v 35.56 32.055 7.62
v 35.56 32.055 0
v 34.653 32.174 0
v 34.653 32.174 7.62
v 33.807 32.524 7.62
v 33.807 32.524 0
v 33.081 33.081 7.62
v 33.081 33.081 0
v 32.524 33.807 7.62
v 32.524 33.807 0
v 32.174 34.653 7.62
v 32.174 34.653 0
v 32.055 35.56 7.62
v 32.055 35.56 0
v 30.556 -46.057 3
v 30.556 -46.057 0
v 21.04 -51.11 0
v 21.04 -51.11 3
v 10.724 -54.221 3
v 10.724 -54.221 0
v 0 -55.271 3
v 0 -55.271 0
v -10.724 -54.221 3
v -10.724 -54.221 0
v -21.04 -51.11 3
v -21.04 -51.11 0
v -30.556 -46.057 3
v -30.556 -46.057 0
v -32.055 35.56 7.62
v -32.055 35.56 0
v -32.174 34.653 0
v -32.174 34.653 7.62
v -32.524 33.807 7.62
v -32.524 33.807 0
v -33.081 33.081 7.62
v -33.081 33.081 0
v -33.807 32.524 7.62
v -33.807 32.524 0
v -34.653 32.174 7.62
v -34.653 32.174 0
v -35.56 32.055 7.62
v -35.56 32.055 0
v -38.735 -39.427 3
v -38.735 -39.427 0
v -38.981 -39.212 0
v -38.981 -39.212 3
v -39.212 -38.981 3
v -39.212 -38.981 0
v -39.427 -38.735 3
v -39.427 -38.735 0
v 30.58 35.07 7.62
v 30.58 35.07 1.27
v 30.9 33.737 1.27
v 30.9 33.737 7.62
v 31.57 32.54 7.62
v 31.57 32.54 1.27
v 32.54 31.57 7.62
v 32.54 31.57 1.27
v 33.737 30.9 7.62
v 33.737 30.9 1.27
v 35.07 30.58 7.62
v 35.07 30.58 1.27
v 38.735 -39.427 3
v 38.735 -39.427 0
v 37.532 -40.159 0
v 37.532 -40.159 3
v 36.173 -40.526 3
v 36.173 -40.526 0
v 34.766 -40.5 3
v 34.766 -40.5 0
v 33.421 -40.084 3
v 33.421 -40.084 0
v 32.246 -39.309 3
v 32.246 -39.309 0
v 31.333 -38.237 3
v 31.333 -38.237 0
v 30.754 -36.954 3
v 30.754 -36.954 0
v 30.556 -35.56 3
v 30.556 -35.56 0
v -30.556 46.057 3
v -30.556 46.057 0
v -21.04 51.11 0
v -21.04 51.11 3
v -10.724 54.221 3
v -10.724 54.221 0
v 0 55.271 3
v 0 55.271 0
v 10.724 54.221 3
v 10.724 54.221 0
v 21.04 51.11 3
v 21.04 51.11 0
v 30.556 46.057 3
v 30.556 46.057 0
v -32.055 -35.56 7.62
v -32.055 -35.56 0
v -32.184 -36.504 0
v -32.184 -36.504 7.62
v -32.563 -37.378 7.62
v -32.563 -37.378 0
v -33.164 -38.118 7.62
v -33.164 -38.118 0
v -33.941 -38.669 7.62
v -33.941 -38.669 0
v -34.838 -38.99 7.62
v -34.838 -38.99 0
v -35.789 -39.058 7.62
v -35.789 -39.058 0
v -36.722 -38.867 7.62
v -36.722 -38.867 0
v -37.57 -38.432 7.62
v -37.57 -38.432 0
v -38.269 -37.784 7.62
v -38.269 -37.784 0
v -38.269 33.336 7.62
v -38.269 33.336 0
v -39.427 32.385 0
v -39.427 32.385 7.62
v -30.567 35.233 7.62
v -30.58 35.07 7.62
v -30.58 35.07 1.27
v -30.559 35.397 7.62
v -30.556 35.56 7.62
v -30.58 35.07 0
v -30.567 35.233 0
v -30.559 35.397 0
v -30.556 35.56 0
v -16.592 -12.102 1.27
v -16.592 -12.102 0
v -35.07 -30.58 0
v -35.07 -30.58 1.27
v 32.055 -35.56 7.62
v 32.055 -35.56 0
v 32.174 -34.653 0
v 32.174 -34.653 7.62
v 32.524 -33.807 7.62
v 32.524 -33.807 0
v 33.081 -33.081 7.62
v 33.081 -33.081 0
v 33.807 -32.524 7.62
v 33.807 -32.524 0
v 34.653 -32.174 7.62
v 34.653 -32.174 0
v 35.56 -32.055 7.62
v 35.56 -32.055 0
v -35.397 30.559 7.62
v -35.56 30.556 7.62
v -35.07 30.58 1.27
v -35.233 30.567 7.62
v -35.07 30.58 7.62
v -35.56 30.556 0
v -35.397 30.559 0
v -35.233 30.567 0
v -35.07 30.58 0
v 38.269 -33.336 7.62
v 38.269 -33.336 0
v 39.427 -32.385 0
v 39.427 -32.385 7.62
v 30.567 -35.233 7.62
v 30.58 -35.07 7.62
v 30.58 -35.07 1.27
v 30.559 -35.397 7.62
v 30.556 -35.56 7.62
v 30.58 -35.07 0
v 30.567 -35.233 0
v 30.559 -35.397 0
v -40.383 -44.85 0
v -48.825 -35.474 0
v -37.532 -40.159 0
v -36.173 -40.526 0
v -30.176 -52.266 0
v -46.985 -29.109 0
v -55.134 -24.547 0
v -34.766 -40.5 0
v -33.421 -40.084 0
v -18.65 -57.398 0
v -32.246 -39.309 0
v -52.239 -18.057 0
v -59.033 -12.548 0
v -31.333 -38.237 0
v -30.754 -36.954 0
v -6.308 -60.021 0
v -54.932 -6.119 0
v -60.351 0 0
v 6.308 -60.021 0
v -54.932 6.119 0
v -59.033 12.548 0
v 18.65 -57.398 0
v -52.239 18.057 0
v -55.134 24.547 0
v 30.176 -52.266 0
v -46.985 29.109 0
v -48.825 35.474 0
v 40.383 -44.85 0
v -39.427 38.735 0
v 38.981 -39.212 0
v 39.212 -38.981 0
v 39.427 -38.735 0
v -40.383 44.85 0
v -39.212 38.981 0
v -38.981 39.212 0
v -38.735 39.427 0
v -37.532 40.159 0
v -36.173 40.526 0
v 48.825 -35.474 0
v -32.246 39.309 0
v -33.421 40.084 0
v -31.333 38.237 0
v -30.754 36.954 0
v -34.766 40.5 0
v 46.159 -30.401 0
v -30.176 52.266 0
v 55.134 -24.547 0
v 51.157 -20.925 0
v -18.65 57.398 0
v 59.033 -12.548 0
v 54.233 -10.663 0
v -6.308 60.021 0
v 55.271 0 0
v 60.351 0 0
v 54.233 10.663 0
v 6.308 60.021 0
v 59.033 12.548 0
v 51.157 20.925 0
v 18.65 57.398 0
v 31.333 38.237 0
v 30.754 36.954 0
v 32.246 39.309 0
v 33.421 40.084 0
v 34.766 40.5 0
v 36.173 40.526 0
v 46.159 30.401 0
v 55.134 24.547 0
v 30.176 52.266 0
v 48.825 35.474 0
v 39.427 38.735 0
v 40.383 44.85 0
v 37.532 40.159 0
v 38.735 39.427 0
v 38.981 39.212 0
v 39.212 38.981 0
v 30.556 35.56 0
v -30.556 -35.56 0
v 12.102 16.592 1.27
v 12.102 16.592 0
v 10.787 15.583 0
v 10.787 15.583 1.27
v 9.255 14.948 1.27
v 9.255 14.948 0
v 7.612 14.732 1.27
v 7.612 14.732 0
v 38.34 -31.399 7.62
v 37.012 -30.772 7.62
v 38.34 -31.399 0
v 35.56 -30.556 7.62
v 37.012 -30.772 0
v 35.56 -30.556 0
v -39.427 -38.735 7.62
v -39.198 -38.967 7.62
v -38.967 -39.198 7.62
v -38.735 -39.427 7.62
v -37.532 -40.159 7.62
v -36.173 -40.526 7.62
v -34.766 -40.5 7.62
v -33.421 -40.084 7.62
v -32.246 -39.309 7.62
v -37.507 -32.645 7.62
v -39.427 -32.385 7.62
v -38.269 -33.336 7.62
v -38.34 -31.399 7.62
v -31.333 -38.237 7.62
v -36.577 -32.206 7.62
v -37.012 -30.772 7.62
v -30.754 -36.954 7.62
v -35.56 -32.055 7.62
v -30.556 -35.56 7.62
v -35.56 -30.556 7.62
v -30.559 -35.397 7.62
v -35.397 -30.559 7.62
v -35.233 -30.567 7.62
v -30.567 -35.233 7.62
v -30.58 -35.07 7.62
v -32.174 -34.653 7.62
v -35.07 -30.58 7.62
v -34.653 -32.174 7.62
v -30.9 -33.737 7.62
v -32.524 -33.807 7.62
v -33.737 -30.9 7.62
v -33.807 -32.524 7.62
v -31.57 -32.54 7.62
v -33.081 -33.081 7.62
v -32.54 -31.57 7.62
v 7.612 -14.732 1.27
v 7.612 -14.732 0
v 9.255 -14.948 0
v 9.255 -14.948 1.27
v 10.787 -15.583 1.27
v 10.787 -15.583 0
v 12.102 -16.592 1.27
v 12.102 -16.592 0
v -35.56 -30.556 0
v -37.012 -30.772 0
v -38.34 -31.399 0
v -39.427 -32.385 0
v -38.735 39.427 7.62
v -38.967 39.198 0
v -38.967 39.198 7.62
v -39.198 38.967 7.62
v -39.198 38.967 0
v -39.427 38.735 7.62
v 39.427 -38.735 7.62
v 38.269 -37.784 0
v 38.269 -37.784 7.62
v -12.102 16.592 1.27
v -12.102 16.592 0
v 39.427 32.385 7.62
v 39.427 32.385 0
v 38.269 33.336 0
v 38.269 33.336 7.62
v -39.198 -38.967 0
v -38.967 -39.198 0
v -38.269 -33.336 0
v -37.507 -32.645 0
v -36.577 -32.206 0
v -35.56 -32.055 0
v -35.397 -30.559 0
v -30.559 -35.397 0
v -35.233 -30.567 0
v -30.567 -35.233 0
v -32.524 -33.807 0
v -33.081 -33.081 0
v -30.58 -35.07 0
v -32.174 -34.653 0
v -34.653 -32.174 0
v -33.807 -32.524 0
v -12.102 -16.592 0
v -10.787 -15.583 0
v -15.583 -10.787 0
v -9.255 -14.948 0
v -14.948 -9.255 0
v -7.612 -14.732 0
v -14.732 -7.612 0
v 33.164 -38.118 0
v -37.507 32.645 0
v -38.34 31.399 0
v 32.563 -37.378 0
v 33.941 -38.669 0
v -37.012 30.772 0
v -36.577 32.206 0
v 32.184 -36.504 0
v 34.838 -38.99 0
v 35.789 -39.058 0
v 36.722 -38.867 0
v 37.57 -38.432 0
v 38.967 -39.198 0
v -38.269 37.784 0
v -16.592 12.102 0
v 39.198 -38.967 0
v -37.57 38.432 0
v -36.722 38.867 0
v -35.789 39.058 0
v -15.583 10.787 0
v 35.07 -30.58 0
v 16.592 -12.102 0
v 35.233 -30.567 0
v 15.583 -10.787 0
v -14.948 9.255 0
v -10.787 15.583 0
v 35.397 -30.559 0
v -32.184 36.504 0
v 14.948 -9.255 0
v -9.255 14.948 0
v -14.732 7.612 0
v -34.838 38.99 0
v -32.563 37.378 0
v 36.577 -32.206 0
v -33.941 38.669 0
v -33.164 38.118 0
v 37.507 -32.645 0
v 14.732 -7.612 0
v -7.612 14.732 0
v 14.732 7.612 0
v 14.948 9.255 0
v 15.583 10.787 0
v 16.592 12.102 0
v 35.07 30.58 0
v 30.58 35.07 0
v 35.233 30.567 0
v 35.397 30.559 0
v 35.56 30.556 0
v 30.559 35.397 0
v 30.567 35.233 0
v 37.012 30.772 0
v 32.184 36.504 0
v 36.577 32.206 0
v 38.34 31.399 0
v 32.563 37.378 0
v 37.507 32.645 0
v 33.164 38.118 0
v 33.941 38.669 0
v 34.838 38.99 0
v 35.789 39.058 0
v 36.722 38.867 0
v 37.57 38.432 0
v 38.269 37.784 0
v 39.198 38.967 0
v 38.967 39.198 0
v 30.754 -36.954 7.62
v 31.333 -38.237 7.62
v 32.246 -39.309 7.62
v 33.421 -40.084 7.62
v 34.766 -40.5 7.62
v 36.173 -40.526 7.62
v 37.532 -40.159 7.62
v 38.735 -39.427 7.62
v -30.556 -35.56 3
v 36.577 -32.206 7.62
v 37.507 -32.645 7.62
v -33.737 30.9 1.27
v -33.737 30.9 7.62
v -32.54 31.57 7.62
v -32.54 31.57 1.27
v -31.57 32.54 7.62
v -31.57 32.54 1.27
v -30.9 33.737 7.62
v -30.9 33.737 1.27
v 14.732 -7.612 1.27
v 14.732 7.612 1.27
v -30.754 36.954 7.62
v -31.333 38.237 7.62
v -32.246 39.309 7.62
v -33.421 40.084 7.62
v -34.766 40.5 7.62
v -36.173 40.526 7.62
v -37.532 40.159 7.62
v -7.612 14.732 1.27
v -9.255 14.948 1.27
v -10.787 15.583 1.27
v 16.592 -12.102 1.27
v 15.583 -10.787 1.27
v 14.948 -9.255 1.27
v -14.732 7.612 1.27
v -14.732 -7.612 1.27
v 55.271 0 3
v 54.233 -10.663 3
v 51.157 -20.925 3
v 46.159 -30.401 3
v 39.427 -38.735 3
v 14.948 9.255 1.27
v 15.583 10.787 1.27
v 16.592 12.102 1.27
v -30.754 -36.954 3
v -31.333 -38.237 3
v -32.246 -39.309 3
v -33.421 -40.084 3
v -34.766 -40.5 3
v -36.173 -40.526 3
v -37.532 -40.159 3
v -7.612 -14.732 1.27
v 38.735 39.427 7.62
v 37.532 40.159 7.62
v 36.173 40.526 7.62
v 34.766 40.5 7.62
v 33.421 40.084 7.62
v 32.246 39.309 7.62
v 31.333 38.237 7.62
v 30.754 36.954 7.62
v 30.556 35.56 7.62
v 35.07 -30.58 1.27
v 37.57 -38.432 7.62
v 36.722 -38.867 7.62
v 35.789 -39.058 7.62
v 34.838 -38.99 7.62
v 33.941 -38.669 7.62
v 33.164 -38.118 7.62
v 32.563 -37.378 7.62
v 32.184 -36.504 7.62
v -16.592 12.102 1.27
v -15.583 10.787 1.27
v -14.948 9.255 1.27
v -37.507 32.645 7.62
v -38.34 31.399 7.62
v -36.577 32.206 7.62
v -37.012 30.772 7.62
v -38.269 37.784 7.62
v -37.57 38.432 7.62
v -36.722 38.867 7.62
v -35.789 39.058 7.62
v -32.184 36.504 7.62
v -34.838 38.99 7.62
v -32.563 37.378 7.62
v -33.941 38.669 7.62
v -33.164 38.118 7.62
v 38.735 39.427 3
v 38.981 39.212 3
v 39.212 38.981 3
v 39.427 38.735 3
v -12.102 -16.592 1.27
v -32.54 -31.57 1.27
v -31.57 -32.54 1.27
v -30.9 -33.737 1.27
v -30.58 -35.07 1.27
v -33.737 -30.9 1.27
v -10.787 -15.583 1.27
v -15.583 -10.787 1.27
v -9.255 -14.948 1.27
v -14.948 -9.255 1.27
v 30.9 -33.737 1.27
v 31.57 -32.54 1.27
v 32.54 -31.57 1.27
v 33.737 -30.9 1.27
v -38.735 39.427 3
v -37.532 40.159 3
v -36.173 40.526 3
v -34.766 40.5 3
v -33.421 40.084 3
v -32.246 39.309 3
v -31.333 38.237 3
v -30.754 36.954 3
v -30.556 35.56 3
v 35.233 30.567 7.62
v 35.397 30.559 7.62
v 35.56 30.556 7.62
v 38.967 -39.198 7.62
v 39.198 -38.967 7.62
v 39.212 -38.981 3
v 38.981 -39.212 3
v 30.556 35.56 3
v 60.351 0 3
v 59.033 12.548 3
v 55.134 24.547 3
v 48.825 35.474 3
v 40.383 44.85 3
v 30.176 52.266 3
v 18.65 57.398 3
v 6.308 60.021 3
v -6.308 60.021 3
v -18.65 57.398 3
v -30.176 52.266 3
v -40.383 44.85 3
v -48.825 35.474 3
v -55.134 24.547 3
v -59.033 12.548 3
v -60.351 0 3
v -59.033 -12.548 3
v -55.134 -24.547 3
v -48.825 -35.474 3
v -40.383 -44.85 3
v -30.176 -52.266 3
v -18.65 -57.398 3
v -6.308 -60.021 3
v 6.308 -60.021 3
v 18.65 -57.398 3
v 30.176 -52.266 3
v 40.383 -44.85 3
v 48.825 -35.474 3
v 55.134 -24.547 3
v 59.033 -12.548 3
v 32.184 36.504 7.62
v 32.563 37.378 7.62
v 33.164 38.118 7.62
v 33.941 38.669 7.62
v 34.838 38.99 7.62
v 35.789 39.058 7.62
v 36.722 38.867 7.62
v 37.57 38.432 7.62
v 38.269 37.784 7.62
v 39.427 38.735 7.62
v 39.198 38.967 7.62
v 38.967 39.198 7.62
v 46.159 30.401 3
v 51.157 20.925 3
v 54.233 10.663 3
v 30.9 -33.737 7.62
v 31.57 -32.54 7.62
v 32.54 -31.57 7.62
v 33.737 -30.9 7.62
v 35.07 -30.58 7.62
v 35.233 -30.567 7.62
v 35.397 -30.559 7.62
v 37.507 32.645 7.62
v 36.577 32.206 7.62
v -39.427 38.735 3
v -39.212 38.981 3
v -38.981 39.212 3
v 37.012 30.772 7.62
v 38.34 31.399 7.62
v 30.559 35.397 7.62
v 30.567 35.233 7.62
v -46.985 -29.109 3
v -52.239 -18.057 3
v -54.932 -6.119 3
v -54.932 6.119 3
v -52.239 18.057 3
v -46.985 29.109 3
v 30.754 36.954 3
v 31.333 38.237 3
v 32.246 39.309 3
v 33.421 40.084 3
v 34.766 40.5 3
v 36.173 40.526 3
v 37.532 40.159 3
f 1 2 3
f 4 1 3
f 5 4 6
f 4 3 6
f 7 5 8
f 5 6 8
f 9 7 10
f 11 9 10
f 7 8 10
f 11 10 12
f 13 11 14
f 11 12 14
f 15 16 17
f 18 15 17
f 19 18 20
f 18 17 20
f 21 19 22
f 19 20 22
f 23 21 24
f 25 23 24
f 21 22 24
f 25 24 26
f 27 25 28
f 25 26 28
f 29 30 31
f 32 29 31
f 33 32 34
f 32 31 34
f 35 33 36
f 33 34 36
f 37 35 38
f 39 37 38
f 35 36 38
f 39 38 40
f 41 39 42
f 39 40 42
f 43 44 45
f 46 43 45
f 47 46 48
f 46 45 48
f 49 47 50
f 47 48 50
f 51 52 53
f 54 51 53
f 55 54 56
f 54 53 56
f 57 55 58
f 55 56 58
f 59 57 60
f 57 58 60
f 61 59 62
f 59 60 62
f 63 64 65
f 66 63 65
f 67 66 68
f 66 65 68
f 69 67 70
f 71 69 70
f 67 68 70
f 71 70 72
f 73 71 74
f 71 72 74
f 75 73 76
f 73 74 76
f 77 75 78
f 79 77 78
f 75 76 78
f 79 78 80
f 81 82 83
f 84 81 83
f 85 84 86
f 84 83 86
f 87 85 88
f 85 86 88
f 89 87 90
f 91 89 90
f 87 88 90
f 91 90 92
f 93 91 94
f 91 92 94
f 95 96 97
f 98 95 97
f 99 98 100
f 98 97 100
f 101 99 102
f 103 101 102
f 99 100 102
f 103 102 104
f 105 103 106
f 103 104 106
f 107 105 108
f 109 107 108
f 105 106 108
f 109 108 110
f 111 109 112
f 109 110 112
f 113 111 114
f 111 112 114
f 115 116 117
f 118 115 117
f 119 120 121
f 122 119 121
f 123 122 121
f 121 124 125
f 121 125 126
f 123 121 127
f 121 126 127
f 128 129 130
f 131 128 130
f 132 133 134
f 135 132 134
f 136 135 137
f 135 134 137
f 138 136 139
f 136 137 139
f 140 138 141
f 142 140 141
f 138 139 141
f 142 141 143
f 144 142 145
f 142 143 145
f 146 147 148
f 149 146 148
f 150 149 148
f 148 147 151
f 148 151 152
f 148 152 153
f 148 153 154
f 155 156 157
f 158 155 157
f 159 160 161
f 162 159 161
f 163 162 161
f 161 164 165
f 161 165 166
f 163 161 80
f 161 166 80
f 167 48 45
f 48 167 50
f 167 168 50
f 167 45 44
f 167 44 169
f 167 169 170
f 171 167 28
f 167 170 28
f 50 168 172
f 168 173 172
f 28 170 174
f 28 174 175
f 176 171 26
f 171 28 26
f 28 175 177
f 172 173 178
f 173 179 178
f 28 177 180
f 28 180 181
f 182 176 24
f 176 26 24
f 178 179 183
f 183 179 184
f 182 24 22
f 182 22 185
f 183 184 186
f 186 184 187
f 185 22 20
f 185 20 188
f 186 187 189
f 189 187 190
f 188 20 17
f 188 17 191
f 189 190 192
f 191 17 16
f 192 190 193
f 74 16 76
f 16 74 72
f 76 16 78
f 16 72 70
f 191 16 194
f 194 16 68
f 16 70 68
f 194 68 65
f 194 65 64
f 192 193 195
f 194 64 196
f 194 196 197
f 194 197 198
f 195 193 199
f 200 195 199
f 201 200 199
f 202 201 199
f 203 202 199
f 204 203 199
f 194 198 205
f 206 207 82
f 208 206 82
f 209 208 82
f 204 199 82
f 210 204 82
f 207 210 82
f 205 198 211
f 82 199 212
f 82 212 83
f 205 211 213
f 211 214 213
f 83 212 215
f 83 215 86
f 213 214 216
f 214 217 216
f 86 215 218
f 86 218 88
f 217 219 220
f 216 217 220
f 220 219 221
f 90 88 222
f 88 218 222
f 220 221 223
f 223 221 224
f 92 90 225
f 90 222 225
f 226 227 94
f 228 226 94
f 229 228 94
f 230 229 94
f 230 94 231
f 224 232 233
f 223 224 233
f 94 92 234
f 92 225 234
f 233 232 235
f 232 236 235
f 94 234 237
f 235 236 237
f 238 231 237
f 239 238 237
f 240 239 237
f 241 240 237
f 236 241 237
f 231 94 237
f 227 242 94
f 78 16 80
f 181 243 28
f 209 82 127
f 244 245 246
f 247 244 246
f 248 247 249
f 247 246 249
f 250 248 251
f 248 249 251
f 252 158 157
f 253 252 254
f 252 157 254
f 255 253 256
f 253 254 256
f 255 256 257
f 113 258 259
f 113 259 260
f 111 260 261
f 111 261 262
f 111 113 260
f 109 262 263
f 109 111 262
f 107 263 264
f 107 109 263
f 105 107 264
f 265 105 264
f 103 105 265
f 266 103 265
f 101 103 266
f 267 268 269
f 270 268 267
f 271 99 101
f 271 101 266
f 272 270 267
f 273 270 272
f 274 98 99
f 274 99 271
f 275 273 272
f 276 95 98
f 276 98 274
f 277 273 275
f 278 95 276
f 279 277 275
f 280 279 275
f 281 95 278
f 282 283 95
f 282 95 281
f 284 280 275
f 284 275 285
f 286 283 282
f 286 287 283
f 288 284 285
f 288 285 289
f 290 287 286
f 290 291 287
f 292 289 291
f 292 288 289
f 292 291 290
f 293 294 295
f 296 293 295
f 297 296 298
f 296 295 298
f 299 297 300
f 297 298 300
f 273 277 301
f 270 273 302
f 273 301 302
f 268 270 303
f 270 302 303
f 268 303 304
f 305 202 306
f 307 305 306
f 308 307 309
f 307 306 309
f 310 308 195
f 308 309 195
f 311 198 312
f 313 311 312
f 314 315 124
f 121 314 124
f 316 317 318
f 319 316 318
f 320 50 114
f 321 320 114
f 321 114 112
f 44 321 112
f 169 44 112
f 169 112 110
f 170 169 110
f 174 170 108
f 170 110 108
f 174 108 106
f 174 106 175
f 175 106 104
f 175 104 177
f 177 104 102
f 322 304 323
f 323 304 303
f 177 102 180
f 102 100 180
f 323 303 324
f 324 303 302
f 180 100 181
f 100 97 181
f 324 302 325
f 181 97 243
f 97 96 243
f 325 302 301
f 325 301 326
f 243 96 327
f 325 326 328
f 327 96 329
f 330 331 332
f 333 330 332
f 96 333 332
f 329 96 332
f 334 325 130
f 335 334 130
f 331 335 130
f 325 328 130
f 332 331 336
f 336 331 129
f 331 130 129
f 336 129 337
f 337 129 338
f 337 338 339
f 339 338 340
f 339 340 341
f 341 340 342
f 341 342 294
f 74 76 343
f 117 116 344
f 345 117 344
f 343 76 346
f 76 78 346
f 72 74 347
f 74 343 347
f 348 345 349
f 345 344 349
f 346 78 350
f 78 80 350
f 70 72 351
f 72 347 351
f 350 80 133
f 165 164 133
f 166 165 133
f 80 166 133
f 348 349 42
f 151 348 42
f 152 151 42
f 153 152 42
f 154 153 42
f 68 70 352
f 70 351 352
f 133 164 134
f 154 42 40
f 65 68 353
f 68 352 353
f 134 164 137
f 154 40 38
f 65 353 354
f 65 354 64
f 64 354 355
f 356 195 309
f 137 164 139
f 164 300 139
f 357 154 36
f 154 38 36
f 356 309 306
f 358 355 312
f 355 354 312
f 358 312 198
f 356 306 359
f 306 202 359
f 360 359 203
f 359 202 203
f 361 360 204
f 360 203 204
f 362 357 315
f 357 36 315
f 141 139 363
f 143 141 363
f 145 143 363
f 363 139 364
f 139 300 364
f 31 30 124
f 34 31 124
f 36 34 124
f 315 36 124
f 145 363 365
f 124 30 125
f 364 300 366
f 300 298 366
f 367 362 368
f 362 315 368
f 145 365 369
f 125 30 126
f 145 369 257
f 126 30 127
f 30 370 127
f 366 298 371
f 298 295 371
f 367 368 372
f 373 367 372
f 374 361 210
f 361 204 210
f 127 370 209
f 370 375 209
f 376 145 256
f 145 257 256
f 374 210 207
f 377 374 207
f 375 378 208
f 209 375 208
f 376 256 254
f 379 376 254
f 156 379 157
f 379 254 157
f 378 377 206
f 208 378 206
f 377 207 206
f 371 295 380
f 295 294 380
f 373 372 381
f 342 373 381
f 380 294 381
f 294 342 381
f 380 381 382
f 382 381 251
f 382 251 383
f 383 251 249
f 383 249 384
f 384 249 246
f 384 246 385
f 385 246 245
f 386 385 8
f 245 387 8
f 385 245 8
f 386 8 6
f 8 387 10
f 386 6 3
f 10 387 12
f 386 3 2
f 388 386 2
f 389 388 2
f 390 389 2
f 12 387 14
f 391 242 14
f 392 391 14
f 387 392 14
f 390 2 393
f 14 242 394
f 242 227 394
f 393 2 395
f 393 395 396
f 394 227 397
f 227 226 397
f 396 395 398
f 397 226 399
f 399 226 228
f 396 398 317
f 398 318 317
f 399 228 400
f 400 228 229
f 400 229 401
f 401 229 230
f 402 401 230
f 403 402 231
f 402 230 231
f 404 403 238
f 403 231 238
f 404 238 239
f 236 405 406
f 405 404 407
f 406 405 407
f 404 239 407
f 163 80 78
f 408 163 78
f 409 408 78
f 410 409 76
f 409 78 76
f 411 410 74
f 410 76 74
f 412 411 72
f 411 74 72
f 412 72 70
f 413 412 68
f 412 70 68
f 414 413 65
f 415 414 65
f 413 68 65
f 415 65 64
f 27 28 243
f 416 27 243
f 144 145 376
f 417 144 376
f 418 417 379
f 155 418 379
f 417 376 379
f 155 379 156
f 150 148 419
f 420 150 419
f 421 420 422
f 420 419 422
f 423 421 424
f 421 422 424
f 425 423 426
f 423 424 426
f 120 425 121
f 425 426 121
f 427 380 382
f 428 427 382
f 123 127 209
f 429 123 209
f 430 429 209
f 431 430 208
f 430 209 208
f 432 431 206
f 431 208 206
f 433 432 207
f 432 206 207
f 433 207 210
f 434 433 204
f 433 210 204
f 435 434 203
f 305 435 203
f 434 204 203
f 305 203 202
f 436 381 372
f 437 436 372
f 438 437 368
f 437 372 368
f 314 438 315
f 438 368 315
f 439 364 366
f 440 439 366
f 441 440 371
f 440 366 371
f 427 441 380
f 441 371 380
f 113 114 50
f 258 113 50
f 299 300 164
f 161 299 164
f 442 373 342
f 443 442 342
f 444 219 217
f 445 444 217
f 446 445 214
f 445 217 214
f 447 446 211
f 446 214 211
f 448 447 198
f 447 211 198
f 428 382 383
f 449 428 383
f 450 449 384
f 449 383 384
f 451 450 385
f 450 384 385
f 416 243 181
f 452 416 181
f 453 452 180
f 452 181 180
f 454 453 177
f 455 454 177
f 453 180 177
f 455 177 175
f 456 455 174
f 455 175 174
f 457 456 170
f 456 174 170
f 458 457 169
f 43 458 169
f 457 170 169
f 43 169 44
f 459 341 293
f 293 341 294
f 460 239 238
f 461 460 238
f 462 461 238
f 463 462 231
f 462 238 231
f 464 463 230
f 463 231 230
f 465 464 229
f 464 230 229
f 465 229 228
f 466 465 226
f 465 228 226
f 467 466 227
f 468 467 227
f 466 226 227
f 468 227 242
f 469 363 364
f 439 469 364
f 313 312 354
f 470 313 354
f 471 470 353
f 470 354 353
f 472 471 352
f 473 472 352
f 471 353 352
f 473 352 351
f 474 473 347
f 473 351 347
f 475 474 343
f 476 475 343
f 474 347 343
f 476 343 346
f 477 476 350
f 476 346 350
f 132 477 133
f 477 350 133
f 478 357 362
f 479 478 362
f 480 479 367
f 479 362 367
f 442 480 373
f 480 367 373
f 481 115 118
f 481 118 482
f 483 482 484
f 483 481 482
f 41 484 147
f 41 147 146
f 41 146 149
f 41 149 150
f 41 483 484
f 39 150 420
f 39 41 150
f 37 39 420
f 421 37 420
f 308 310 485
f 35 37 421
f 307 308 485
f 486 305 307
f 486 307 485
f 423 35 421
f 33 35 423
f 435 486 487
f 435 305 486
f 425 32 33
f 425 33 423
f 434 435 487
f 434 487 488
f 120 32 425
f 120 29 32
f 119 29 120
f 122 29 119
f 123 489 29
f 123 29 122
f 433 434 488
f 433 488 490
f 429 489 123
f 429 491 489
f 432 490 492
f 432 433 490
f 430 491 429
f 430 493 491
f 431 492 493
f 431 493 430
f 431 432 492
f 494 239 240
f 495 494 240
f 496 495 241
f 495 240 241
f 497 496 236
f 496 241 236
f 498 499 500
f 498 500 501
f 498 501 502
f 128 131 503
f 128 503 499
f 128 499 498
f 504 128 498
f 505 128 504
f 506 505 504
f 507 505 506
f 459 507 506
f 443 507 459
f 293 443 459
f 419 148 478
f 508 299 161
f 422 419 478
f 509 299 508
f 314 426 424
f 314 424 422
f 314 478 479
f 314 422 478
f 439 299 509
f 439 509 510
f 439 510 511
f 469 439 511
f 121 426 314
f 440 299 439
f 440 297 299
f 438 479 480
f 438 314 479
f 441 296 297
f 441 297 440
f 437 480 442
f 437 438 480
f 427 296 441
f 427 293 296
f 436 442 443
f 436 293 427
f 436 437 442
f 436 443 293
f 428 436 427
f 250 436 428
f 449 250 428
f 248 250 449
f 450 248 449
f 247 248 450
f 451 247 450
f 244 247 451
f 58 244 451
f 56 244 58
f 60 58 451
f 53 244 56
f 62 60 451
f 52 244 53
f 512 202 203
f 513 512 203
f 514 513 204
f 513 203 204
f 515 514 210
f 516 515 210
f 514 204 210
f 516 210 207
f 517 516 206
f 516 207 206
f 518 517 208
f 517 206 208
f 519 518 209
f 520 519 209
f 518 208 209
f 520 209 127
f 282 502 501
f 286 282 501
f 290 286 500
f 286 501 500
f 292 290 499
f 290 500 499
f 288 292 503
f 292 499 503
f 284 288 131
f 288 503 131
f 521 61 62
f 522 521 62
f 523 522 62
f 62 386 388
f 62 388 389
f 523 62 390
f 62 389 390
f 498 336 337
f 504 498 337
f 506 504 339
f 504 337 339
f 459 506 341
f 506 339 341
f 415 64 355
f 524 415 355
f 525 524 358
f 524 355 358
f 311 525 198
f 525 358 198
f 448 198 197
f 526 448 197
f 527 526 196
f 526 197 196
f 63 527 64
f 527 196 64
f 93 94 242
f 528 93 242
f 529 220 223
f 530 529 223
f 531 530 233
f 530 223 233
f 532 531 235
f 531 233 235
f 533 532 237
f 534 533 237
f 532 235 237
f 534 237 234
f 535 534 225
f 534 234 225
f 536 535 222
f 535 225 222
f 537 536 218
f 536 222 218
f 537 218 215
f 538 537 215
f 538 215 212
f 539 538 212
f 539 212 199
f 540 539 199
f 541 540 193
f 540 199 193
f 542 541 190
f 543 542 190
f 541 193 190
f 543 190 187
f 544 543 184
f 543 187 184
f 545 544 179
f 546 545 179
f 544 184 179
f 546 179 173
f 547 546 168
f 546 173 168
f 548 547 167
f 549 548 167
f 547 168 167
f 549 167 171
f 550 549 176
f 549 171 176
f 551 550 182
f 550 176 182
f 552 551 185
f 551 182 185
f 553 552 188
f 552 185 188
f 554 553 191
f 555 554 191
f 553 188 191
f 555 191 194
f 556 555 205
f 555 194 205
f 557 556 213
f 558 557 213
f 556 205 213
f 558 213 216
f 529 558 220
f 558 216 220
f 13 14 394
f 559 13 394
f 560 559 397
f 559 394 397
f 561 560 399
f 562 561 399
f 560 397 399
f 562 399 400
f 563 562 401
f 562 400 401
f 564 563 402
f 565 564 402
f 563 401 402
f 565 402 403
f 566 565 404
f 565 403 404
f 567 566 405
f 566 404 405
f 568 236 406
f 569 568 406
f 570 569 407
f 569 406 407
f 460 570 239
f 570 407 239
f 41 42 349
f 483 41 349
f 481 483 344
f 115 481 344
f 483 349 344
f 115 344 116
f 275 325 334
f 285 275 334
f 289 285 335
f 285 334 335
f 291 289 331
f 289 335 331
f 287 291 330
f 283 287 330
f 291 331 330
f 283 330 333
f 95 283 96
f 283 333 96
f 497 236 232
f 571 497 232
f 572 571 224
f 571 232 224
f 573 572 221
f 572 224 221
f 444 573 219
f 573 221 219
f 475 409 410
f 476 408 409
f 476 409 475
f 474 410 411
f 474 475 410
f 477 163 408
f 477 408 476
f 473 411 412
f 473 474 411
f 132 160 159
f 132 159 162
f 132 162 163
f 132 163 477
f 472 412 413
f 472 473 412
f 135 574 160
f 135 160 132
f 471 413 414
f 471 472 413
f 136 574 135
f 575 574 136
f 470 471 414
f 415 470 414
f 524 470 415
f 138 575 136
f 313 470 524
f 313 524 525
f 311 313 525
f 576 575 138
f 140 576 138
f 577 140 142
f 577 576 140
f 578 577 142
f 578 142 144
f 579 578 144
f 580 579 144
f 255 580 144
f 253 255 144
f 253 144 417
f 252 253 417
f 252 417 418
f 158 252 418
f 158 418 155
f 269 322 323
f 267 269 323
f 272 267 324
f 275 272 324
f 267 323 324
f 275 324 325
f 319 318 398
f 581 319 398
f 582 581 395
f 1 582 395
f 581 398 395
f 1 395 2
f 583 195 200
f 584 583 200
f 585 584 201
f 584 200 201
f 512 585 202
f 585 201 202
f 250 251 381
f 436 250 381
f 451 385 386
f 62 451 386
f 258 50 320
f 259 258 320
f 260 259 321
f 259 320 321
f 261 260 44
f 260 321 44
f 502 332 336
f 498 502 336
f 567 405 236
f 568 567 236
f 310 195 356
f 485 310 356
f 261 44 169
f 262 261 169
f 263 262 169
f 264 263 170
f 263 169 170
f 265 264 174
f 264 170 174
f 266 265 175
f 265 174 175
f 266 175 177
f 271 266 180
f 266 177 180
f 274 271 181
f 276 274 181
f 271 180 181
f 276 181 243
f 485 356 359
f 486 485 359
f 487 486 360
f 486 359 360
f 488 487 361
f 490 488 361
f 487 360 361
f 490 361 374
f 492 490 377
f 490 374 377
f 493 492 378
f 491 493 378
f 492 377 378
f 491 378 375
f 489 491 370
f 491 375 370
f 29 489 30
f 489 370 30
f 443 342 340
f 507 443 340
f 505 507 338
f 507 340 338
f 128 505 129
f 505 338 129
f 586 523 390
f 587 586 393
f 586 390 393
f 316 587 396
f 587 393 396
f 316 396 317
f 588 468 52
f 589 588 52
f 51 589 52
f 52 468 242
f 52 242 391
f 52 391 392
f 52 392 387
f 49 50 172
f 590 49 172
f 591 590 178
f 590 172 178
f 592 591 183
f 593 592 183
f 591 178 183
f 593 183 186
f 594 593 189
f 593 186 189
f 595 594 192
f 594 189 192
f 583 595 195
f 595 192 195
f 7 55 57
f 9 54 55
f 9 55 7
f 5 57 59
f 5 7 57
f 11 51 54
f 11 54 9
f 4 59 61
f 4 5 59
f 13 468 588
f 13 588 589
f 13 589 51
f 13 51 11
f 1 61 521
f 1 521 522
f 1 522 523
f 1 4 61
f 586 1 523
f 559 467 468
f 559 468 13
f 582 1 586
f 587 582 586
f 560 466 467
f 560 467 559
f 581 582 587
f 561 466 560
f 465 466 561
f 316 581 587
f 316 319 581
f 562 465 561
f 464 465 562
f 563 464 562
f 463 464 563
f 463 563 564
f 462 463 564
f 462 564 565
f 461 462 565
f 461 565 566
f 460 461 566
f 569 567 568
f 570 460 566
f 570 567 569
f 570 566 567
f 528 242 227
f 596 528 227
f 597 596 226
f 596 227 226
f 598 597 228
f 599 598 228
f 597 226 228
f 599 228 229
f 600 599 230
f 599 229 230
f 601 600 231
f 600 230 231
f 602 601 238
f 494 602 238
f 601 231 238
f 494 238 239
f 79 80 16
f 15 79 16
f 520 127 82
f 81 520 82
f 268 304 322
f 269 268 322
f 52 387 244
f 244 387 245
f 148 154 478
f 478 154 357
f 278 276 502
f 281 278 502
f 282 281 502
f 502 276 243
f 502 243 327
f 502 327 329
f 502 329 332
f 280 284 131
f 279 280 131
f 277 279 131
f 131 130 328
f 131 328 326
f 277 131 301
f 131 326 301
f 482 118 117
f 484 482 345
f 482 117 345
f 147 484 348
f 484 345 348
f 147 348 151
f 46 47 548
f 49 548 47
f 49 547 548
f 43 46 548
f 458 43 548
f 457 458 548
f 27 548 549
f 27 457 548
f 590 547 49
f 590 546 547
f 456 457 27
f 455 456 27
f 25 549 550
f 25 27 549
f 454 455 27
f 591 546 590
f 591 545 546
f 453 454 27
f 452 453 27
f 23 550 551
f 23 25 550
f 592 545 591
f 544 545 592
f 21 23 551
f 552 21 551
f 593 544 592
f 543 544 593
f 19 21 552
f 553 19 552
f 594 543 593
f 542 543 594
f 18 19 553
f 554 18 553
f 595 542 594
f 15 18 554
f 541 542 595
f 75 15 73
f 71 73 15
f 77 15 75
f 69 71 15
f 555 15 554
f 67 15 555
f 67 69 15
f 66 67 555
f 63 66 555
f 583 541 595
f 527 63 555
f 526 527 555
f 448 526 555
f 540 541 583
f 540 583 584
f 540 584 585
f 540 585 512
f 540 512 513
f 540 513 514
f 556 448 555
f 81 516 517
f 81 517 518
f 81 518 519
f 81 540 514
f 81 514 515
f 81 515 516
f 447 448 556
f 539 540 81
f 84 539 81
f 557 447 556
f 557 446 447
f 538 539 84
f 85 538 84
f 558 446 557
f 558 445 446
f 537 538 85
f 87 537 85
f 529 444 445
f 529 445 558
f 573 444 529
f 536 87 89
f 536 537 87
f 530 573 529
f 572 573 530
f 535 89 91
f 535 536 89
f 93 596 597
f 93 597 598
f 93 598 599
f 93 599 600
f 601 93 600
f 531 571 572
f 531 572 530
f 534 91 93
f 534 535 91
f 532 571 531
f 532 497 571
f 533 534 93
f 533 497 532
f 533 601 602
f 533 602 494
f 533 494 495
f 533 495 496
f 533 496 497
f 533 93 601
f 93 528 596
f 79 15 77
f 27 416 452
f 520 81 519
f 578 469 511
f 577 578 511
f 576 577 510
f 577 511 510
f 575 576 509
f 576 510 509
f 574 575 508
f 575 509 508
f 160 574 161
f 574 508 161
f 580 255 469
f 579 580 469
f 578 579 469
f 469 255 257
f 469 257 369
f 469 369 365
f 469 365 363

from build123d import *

# Parameters (mm, degrees)
F1_DEPTH = 1.27
F2_DEPTH = 7.62
F0_R     = 60.3513875408
F3_DEPTH = 3


with BuildPart() as f1:
    # F0 (on Top) → F1 (new body)
    with BuildSketch(Plane.XY):
        with BuildLine():
            Line((-12.1017438942, 16.5918719547), (-30.5802157427, 35.0703438033))
            ThreePointArc((-30.5802157427, 35.0703438033), (-32.0217790883, 32.0217790883), (-35.0703438033, 30.5802157427))
            Line((-35.0703438033, 30.5802157427), (-16.5918719547, 12.1017438942))
            Line((-16.5918719547, 12.1017438942), (-14.732, 10.2418719395))
            Line((-14.732, 10.2418719395), (-14.732, 14.732))
            Line((-14.732, 14.732), (-10.2418719395, 14.732))
            Line((-10.2418719395, 14.732), (-12.1017438942, 16.5918719547))
        make_face()
        Polygon((14.732, 14.732), (10.2418719395, 14.732), (7.6116158184, 14.732), (-7.6116157971, 14.732), (-10.2418719395, 14.732), (-14.732, 14.732), (-14.732, 10.2418719395), (-14.732, 7.6116158184), (-14.732, -7.6116158184), (-14.732, -10.2418719395), (-14.732, -14.732), (-10.2418719395, -14.732), (-7.6116158234, -14.732), (7.6116158184, -14.732), (10.2418719395, -14.732), (14.732, -14.732), (14.732, -10.2418719395), (14.732, -7.6116158184), (14.732, 7.6116158184), (14.732, 10.2418719395), align=None)
        with BuildLine():
            ThreePointArc((35.0703438033, 30.5802157427), (32.0217790883, 32.0217790883), (30.5802157427, 35.0703438033))
            Line((30.5802157427, 35.0703438033), (12.1017438942, 16.5918719547))
            Line((12.1017438942, 16.5918719547), (10.2418719395, 14.732))
            Line((10.2418719395, 14.732), (14.732, 14.732))
            Line((14.732, 14.732), (14.732, 10.2418719395))
            Line((14.732, 10.2418719395), (16.5918719304, 12.1017438699))
            Line((16.5918719304, 12.1017438699), (35.0703438033, 30.5802157427))
        make_face()
        with BuildLine():
            ThreePointArc((30.5802157427, -35.0703438033), (32.0217790883, -32.0217790883), (35.0703438033, -30.5802157427))
            Line((35.0703438033, -30.5802157427), (16.5918719698, -12.1017439092))
            Line((16.5918719698, -12.1017439092), (14.732, -10.2418719395))
            Line((14.732, -10.2418719395), (14.732, -14.732))
            Line((14.732, -14.732), (10.2418719395, -14.732))
            Line((10.2418719395, -14.732), (12.1017438942, -16.5918719547))
            Line((12.1017438942, -16.5918719547), (30.5802157427, -35.0703438033))
        make_face()
        with BuildLine():
            Line((-16.5918719154, -12.1017438548), (-35.0703438033, -30.5802157427))
            ThreePointArc((-35.0703438033, -30.5802157427), (-32.0217790883, -32.0217790883), (-30.5802157427, -35.0703438033))
            Line((-30.5802157427, -35.0703438033), (-12.1017438699, -16.5918719304))
            Line((-12.1017438699, -16.5918719304), (-10.2418719395, -14.732))
            Line((-10.2418719395, -14.732), (-14.732, -14.732))
            Line((-14.732, -14.732), (-14.732, -10.2418719395))
            Line((-14.732, -10.2418719395), (-16.5918719154, -12.1017438548))
        make_face()
        with BuildLine():
            Line((-10.2418719395, -14.732), (-12.1017438699, -16.5918719304))
            ThreePointArc((-12.1017438699, -16.5918719304), (-10.0416556103, -15.2153649671), (-7.6116158234, -14.732))
            Line((-7.6116158234, -14.732), (-10.2418719395, -14.732))
        make_face()
        with BuildLine():
            Line((-14.732, -10.2418719395), (-14.732, -7.6116158184))
            ThreePointArc((-14.732, -7.6116158184), (-15.215364962, -10.0416555982), (-16.5918719154, -12.1017438548))
            Line((-16.5918719154, -12.1017438548), (-14.732, -10.2418719395))
        make_face()
        with BuildLine():
            ThreePointArc((7.6116158184, -14.732), (10.0416556239, -15.2153649727), (12.1017438942, -16.5918719547))
            Line((12.1017438942, -16.5918719547), (10.2418719395, -14.732))
            Line((10.2418719395, -14.732), (7.6116158184, -14.732))
        make_face()
        with BuildLine():
            ThreePointArc((16.5918719698, -12.1017439092), (15.2153649768, -10.0416556337), (14.732, -7.6116158184))
            Line((14.732, -7.6116158184), (14.732, -10.2418719395))
            Line((14.732, -10.2418719395), (16.5918719698, -12.1017439092))
        make_face()
        with BuildLine():
            ThreePointArc((14.732, 7.6116158184), (15.2153649661, 10.041655608), (16.5918719304, 12.1017438699))
            Line((16.5918719304, 12.1017438699), (14.732, 10.2418719395))
            Line((14.732, 10.2418719395), (14.732, 7.6116158184))
        make_face()
        with BuildLine():
            Line((10.2418719395, 14.732), (12.1017438942, 16.5918719547))
            ThreePointArc((12.1017438942, 16.5918719547), (10.0416556239, 15.2153649727), (7.6116158184, 14.732))
            Line((7.6116158184, 14.732), (10.2418719395, 14.732))
        make_face()
        with BuildLine():
            ThreePointArc((-7.6116157971, 14.732), (-10.0416556141, 15.2153649686), (-12.1017438942, 16.5918719547))
            Line((-12.1017438942, 16.5918719547), (-10.2418719395, 14.732))
            Line((-10.2418719395, 14.732), (-7.6116157971, 14.732))
        make_face()
        with BuildLine():
            Line((-14.732, 10.2418719395), (-16.5918719547, 12.1017438942))
            ThreePointArc((-16.5918719547, 12.1017438942), (-15.2153649727, 10.0416556239), (-14.732, 7.6116158184))
            Line((-14.732, 7.6116158184), (-14.732, 10.2418719395))
        make_face()
    extrude(amount=F1_DEPTH)

    # F0 (on Top) → F2 (join)
    with BuildSketch(Plane.XY):
        with BuildLine():
            Line((-32.0548, 35.56), (-30.5562, 35.56))
            ThreePointArc((-30.5562, 35.56), (-33.4209640676, 40.0835538816), (-38.735, 39.4274784343))
            ThreePointArc((-38.735, 39.4274784343), (-39.0827729357, 39.0827729357), (-39.4274784343, 38.735))
            Line((-39.4274784343, 38.735), (-38.2691980911, 37.7841116751))
            ThreePointArc((-38.2691980911, 37.7841116751), (-34.378867939, 38.8602051594), (-32.0548, 35.56))
        make_face()
        with BuildLine():
            ThreePointArc((-30.5802157427, 35.0703438033), (-30.562207542, 35.3148776087), (-30.5562, 35.56))
            Line((-30.5562, 35.56), (-32.0548, 35.56))
            ThreePointArc((-32.0548, 35.56), (-33.0814493106, 33.0814493106), (-35.56, 32.0548))
            Line((-35.56, 32.0548), (-35.56, 30.5562))
            ThreePointArc((-35.56, 30.5562), (-35.3148776087, 30.562207542), (-35.0703438033, 30.5802157427))
            ThreePointArc((-35.0703438033, 30.5802157427), (-32.0217790883, 32.0217790883), (-30.5802157427, 35.0703438033))
        make_face()
        with BuildLine():
            Line((-35.56, 30.5562), (-35.56, 32.0548))
            ThreePointArc((-35.56, 32.0548), (-37.0584109577, 32.3912160626), (-38.2691980911, 33.3358883249))
            Line((-38.2691980911, 33.3358883249), (-39.4274784343, 32.385))
            ThreePointArc((-39.4274784343, 32.385), (-37.6990359324, 31.0364461184), (-35.56, 30.5562))
        make_face()
        with BuildLine():
            ThreePointArc((38.735, 39.4274784343), (33.4209640676, 40.0835538816), (30.5562, 35.56))
            Line((30.5562, 35.56), (32.0548, 35.56))
            ThreePointArc((32.0548, 35.56), (34.378867939, 38.8602051594), (38.2691980911, 37.7841116751))
            Line((38.2691980911, 37.7841116751), (39.4274784343, 38.735))
            ThreePointArc((39.4274784343, 38.735), (39.0827729357, 39.0827729357), (38.735, 39.4274784343))
        make_face()
        with BuildLine():
            Line((32.0548, 35.56), (30.5562, 35.56))
            ThreePointArc((30.5562, 35.56), (30.562207542, 35.3148776087), (30.5802157427, 35.0703438033))
            ThreePointArc((30.5802157427, 35.0703438033), (32.0217790883, 32.0217790883), (35.0703438033, 30.5802157427))
            ThreePointArc((35.0703438033, 30.5802157427), (35.3148776087, 30.562207542), (35.56, 30.5562))
            Line((35.56, 30.5562), (35.56, 32.0548))
            ThreePointArc((35.56, 32.0548), (33.0814493106, 33.0814493106), (32.0548, 35.56))
        make_face()
        with BuildLine():
            ThreePointArc((38.2691980911, 33.3358883249), (37.0584109577, 32.3912160626), (35.56, 32.0548))
            Line((35.56, 32.0548), (35.56, 30.5562))
            ThreePointArc((35.56, 30.5562), (37.6990359324, 31.0364461184), (39.4274784343, 32.385))
            Line((39.4274784343, 32.385), (38.2691980911, 33.3358883249))
        make_face()
        with BuildLine():
            ThreePointArc((39.4274784343, -32.385), (37.6990359324, -31.0364461184), (35.56, -30.5562))
            Line((35.56, -30.5562), (35.56, -32.0548))
            ThreePointArc((35.56, -32.0548), (37.0584109577, -32.3912160626), (38.2691980911, -33.3358883249))
            Line((38.2691980911, -33.3358883249), (39.4274784343, -32.385))
        make_face()
        with BuildLine():
            Line((35.56, -32.0548), (35.56, -30.5562))
            ThreePointArc((35.56, -30.5562), (35.3148776087, -30.562207542), (35.0703438033, -30.5802157427))
            ThreePointArc((35.0703438033, -30.5802157427), (32.0217790883, -32.0217790883), (30.5802157427, -35.0703438033))
            ThreePointArc((30.5802157427, -35.0703438033), (30.562207542, -35.3148776087), (30.5562, -35.56))
            Line((30.5562, -35.56), (32.0548, -35.56))
            ThreePointArc((32.0548, -35.56), (33.0814493106, -33.0814493106), (35.56, -32.0548))
        make_face()
        with BuildLine():
            ThreePointArc((38.735, -39.4274784343), (39.0827729357, -39.0827729357), (39.4274784343, -38.735))
            Line((39.4274784343, -38.735), (38.2691980911, -37.7841116751))
            ThreePointArc((38.2691980911, -37.7841116751), (34.378867939, -38.8602051594), (32.0548, -35.56))
            Line((32.0548, -35.56), (30.5562, -35.56))
            ThreePointArc((30.5562, -35.56), (33.4209640676, -40.0835538816), (38.735, -39.4274784343))
        make_face()
        with BuildLine():
            Line((-38.2691980911, -37.7841116751), (-39.4274784343, -38.735))
            ThreePointArc((-39.4274784343, -38.735), (-39.0827729357, -39.0827729357), (-38.735, -39.4274784343))
            ThreePointArc((-38.735, -39.4274784343), (-33.4209640676, -40.0835538816), (-30.5562, -35.56))
            Line((-30.5562, -35.56), (-32.0548, -35.56))
            ThreePointArc((-32.0548, -35.56), (-34.378867939, -38.8602051594), (-38.2691980911, -37.7841116751))
        make_face()
        with BuildLine():
            ThreePointArc((-35.0703438033, -30.5802157427), (-35.3148776087, -30.562207542), (-35.56, -30.5562))
            Line((-35.56, -30.5562), (-35.56, -32.0548))
            ThreePointArc((-35.56, -32.0548), (-33.0814493106, -33.0814493106), (-32.0548, -35.56))
            Line((-32.0548, -35.56), (-30.5562, -35.56))
            ThreePointArc((-30.5562, -35.56), (-30.562207542, -35.3148776087), (-30.5802157427, -35.0703438033))
            ThreePointArc((-30.5802157427, -35.0703438033), (-32.0217790883, -32.0217790883), (-35.0703438033, -30.5802157427))
        make_face()
        with BuildLine():
            Line((-35.56, -32.0548), (-35.56, -30.5562))
            ThreePointArc((-35.56, -30.5562), (-37.6990359324, -31.0364461184), (-39.4274784343, -32.385))
            Line((-39.4274784343, -32.385), (-38.2691980911, -33.3358883249))
            ThreePointArc((-38.2691980911, -33.3358883249), (-37.0584109577, -32.3912160626), (-35.56, -32.0548))
        make_face()
    extrude(amount=F2_DEPTH)


with BuildPart() as f3:
    # F0 (on Top) → F3 (new body)
    with BuildSketch(Plane.XY):
        Circle(F0_R)
        with BuildLine():
            ThreePointArc((30.5562, 46.0569747405), (34.8038094851, 42.9374094003), (38.735, 39.4274784343))
            ThreePointArc((38.735, 39.4274784343), (39.0982209117, 39.0982209117), (39.4274784343, 38.735))
            ThreePointArc((39.4274784343, 38.735), (51.1572952813, 20.9250428959), (55.2713875408, 0))
            ThreePointArc((55.2713875408, 0), (51.1572952813, -20.9250428959), (39.4274784343, -38.735))
            ThreePointArc((39.4274784343, -38.735), (39.0982209117, -39.0982209117), (38.735, -39.4274784343))
            ThreePointArc((38.735, -39.4274784343), (34.8038094851, -42.9374094003), (30.5562, -46.0569747405))
            ThreePointArc((30.5562, -46.0569747405), (0, -55.2713875408), (-30.5562, -46.0569747405))
            ThreePointArc((-30.5562, -46.0569747405), (-34.8038094851, -42.9374094003), (-38.735, -39.4274784343))
            ThreePointArc((-38.735, -39.4274784343), (-39.0982209117, -39.0982209117), (-39.4274784343, -38.735))
            ThreePointArc((-39.4274784343, -38.735), (-55.2713875408, 0), (-39.4274784343, 38.735))
            ThreePointArc((-39.4274784343, 38.735), (-39.0982209117, 39.0982209117), (-38.735, 39.4274784343))
            ThreePointArc((-38.735, 39.4274784343), (-34.8038094851, 42.9374094003), (-30.5562, 46.0569747405))
            ThreePointArc((-30.5562, 46.0569747405), (0, 55.2713875408), (30.5562, 46.0569747405))
        make_face(mode=Mode.SUBTRACT)
        with BuildLine():
            ThreePointArc((-30.5562, -35.56), (-33.4209640676, -40.0835538816), (-38.735, -39.4274784343))
            ThreePointArc((-38.735, -39.4274784343), (-34.8038094851, -42.9374094003), (-30.5562, -46.0569747405))
            Line((-30.5562, -46.0569747405), (-30.5562, -35.56))
        make_face()
        with BuildLine():
            ThreePointArc((-38.735, 39.4274784343), (-33.4209640676, 40.0835538816), (-30.5562, 35.56))
            Line((-30.5562, 35.56), (-30.5562, 46.0569747405))
            ThreePointArc((-30.5562, 46.0569747405), (-34.8038094851, 42.9374094003), (-38.735, 39.4274784343))
        make_face()
        with BuildLine():
            Line((30.5562, 46.0569747405), (30.5562, 35.56))
            ThreePointArc((30.5562, 35.56), (33.4209640676, 40.0835538816), (38.735, 39.4274784343))
            ThreePointArc((38.735, 39.4274784343), (34.8038094851, 42.9374094003), (30.5562, 46.0569747405))
        make_face()
        with BuildLine():
            ThreePointArc((30.5562, -46.0569747405), (34.8038094851, -42.9374094003), (38.735, -39.4274784343))
            ThreePointArc((38.735, -39.4274784343), (33.4209640676, -40.0835538816), (30.5562, -35.56))
            Line((30.5562, -35.56), (30.5562, -46.0569747405))
        make_face()
    extrude(amount=F3_DEPTH)


solid = Compound([f1.part, f3.part])
